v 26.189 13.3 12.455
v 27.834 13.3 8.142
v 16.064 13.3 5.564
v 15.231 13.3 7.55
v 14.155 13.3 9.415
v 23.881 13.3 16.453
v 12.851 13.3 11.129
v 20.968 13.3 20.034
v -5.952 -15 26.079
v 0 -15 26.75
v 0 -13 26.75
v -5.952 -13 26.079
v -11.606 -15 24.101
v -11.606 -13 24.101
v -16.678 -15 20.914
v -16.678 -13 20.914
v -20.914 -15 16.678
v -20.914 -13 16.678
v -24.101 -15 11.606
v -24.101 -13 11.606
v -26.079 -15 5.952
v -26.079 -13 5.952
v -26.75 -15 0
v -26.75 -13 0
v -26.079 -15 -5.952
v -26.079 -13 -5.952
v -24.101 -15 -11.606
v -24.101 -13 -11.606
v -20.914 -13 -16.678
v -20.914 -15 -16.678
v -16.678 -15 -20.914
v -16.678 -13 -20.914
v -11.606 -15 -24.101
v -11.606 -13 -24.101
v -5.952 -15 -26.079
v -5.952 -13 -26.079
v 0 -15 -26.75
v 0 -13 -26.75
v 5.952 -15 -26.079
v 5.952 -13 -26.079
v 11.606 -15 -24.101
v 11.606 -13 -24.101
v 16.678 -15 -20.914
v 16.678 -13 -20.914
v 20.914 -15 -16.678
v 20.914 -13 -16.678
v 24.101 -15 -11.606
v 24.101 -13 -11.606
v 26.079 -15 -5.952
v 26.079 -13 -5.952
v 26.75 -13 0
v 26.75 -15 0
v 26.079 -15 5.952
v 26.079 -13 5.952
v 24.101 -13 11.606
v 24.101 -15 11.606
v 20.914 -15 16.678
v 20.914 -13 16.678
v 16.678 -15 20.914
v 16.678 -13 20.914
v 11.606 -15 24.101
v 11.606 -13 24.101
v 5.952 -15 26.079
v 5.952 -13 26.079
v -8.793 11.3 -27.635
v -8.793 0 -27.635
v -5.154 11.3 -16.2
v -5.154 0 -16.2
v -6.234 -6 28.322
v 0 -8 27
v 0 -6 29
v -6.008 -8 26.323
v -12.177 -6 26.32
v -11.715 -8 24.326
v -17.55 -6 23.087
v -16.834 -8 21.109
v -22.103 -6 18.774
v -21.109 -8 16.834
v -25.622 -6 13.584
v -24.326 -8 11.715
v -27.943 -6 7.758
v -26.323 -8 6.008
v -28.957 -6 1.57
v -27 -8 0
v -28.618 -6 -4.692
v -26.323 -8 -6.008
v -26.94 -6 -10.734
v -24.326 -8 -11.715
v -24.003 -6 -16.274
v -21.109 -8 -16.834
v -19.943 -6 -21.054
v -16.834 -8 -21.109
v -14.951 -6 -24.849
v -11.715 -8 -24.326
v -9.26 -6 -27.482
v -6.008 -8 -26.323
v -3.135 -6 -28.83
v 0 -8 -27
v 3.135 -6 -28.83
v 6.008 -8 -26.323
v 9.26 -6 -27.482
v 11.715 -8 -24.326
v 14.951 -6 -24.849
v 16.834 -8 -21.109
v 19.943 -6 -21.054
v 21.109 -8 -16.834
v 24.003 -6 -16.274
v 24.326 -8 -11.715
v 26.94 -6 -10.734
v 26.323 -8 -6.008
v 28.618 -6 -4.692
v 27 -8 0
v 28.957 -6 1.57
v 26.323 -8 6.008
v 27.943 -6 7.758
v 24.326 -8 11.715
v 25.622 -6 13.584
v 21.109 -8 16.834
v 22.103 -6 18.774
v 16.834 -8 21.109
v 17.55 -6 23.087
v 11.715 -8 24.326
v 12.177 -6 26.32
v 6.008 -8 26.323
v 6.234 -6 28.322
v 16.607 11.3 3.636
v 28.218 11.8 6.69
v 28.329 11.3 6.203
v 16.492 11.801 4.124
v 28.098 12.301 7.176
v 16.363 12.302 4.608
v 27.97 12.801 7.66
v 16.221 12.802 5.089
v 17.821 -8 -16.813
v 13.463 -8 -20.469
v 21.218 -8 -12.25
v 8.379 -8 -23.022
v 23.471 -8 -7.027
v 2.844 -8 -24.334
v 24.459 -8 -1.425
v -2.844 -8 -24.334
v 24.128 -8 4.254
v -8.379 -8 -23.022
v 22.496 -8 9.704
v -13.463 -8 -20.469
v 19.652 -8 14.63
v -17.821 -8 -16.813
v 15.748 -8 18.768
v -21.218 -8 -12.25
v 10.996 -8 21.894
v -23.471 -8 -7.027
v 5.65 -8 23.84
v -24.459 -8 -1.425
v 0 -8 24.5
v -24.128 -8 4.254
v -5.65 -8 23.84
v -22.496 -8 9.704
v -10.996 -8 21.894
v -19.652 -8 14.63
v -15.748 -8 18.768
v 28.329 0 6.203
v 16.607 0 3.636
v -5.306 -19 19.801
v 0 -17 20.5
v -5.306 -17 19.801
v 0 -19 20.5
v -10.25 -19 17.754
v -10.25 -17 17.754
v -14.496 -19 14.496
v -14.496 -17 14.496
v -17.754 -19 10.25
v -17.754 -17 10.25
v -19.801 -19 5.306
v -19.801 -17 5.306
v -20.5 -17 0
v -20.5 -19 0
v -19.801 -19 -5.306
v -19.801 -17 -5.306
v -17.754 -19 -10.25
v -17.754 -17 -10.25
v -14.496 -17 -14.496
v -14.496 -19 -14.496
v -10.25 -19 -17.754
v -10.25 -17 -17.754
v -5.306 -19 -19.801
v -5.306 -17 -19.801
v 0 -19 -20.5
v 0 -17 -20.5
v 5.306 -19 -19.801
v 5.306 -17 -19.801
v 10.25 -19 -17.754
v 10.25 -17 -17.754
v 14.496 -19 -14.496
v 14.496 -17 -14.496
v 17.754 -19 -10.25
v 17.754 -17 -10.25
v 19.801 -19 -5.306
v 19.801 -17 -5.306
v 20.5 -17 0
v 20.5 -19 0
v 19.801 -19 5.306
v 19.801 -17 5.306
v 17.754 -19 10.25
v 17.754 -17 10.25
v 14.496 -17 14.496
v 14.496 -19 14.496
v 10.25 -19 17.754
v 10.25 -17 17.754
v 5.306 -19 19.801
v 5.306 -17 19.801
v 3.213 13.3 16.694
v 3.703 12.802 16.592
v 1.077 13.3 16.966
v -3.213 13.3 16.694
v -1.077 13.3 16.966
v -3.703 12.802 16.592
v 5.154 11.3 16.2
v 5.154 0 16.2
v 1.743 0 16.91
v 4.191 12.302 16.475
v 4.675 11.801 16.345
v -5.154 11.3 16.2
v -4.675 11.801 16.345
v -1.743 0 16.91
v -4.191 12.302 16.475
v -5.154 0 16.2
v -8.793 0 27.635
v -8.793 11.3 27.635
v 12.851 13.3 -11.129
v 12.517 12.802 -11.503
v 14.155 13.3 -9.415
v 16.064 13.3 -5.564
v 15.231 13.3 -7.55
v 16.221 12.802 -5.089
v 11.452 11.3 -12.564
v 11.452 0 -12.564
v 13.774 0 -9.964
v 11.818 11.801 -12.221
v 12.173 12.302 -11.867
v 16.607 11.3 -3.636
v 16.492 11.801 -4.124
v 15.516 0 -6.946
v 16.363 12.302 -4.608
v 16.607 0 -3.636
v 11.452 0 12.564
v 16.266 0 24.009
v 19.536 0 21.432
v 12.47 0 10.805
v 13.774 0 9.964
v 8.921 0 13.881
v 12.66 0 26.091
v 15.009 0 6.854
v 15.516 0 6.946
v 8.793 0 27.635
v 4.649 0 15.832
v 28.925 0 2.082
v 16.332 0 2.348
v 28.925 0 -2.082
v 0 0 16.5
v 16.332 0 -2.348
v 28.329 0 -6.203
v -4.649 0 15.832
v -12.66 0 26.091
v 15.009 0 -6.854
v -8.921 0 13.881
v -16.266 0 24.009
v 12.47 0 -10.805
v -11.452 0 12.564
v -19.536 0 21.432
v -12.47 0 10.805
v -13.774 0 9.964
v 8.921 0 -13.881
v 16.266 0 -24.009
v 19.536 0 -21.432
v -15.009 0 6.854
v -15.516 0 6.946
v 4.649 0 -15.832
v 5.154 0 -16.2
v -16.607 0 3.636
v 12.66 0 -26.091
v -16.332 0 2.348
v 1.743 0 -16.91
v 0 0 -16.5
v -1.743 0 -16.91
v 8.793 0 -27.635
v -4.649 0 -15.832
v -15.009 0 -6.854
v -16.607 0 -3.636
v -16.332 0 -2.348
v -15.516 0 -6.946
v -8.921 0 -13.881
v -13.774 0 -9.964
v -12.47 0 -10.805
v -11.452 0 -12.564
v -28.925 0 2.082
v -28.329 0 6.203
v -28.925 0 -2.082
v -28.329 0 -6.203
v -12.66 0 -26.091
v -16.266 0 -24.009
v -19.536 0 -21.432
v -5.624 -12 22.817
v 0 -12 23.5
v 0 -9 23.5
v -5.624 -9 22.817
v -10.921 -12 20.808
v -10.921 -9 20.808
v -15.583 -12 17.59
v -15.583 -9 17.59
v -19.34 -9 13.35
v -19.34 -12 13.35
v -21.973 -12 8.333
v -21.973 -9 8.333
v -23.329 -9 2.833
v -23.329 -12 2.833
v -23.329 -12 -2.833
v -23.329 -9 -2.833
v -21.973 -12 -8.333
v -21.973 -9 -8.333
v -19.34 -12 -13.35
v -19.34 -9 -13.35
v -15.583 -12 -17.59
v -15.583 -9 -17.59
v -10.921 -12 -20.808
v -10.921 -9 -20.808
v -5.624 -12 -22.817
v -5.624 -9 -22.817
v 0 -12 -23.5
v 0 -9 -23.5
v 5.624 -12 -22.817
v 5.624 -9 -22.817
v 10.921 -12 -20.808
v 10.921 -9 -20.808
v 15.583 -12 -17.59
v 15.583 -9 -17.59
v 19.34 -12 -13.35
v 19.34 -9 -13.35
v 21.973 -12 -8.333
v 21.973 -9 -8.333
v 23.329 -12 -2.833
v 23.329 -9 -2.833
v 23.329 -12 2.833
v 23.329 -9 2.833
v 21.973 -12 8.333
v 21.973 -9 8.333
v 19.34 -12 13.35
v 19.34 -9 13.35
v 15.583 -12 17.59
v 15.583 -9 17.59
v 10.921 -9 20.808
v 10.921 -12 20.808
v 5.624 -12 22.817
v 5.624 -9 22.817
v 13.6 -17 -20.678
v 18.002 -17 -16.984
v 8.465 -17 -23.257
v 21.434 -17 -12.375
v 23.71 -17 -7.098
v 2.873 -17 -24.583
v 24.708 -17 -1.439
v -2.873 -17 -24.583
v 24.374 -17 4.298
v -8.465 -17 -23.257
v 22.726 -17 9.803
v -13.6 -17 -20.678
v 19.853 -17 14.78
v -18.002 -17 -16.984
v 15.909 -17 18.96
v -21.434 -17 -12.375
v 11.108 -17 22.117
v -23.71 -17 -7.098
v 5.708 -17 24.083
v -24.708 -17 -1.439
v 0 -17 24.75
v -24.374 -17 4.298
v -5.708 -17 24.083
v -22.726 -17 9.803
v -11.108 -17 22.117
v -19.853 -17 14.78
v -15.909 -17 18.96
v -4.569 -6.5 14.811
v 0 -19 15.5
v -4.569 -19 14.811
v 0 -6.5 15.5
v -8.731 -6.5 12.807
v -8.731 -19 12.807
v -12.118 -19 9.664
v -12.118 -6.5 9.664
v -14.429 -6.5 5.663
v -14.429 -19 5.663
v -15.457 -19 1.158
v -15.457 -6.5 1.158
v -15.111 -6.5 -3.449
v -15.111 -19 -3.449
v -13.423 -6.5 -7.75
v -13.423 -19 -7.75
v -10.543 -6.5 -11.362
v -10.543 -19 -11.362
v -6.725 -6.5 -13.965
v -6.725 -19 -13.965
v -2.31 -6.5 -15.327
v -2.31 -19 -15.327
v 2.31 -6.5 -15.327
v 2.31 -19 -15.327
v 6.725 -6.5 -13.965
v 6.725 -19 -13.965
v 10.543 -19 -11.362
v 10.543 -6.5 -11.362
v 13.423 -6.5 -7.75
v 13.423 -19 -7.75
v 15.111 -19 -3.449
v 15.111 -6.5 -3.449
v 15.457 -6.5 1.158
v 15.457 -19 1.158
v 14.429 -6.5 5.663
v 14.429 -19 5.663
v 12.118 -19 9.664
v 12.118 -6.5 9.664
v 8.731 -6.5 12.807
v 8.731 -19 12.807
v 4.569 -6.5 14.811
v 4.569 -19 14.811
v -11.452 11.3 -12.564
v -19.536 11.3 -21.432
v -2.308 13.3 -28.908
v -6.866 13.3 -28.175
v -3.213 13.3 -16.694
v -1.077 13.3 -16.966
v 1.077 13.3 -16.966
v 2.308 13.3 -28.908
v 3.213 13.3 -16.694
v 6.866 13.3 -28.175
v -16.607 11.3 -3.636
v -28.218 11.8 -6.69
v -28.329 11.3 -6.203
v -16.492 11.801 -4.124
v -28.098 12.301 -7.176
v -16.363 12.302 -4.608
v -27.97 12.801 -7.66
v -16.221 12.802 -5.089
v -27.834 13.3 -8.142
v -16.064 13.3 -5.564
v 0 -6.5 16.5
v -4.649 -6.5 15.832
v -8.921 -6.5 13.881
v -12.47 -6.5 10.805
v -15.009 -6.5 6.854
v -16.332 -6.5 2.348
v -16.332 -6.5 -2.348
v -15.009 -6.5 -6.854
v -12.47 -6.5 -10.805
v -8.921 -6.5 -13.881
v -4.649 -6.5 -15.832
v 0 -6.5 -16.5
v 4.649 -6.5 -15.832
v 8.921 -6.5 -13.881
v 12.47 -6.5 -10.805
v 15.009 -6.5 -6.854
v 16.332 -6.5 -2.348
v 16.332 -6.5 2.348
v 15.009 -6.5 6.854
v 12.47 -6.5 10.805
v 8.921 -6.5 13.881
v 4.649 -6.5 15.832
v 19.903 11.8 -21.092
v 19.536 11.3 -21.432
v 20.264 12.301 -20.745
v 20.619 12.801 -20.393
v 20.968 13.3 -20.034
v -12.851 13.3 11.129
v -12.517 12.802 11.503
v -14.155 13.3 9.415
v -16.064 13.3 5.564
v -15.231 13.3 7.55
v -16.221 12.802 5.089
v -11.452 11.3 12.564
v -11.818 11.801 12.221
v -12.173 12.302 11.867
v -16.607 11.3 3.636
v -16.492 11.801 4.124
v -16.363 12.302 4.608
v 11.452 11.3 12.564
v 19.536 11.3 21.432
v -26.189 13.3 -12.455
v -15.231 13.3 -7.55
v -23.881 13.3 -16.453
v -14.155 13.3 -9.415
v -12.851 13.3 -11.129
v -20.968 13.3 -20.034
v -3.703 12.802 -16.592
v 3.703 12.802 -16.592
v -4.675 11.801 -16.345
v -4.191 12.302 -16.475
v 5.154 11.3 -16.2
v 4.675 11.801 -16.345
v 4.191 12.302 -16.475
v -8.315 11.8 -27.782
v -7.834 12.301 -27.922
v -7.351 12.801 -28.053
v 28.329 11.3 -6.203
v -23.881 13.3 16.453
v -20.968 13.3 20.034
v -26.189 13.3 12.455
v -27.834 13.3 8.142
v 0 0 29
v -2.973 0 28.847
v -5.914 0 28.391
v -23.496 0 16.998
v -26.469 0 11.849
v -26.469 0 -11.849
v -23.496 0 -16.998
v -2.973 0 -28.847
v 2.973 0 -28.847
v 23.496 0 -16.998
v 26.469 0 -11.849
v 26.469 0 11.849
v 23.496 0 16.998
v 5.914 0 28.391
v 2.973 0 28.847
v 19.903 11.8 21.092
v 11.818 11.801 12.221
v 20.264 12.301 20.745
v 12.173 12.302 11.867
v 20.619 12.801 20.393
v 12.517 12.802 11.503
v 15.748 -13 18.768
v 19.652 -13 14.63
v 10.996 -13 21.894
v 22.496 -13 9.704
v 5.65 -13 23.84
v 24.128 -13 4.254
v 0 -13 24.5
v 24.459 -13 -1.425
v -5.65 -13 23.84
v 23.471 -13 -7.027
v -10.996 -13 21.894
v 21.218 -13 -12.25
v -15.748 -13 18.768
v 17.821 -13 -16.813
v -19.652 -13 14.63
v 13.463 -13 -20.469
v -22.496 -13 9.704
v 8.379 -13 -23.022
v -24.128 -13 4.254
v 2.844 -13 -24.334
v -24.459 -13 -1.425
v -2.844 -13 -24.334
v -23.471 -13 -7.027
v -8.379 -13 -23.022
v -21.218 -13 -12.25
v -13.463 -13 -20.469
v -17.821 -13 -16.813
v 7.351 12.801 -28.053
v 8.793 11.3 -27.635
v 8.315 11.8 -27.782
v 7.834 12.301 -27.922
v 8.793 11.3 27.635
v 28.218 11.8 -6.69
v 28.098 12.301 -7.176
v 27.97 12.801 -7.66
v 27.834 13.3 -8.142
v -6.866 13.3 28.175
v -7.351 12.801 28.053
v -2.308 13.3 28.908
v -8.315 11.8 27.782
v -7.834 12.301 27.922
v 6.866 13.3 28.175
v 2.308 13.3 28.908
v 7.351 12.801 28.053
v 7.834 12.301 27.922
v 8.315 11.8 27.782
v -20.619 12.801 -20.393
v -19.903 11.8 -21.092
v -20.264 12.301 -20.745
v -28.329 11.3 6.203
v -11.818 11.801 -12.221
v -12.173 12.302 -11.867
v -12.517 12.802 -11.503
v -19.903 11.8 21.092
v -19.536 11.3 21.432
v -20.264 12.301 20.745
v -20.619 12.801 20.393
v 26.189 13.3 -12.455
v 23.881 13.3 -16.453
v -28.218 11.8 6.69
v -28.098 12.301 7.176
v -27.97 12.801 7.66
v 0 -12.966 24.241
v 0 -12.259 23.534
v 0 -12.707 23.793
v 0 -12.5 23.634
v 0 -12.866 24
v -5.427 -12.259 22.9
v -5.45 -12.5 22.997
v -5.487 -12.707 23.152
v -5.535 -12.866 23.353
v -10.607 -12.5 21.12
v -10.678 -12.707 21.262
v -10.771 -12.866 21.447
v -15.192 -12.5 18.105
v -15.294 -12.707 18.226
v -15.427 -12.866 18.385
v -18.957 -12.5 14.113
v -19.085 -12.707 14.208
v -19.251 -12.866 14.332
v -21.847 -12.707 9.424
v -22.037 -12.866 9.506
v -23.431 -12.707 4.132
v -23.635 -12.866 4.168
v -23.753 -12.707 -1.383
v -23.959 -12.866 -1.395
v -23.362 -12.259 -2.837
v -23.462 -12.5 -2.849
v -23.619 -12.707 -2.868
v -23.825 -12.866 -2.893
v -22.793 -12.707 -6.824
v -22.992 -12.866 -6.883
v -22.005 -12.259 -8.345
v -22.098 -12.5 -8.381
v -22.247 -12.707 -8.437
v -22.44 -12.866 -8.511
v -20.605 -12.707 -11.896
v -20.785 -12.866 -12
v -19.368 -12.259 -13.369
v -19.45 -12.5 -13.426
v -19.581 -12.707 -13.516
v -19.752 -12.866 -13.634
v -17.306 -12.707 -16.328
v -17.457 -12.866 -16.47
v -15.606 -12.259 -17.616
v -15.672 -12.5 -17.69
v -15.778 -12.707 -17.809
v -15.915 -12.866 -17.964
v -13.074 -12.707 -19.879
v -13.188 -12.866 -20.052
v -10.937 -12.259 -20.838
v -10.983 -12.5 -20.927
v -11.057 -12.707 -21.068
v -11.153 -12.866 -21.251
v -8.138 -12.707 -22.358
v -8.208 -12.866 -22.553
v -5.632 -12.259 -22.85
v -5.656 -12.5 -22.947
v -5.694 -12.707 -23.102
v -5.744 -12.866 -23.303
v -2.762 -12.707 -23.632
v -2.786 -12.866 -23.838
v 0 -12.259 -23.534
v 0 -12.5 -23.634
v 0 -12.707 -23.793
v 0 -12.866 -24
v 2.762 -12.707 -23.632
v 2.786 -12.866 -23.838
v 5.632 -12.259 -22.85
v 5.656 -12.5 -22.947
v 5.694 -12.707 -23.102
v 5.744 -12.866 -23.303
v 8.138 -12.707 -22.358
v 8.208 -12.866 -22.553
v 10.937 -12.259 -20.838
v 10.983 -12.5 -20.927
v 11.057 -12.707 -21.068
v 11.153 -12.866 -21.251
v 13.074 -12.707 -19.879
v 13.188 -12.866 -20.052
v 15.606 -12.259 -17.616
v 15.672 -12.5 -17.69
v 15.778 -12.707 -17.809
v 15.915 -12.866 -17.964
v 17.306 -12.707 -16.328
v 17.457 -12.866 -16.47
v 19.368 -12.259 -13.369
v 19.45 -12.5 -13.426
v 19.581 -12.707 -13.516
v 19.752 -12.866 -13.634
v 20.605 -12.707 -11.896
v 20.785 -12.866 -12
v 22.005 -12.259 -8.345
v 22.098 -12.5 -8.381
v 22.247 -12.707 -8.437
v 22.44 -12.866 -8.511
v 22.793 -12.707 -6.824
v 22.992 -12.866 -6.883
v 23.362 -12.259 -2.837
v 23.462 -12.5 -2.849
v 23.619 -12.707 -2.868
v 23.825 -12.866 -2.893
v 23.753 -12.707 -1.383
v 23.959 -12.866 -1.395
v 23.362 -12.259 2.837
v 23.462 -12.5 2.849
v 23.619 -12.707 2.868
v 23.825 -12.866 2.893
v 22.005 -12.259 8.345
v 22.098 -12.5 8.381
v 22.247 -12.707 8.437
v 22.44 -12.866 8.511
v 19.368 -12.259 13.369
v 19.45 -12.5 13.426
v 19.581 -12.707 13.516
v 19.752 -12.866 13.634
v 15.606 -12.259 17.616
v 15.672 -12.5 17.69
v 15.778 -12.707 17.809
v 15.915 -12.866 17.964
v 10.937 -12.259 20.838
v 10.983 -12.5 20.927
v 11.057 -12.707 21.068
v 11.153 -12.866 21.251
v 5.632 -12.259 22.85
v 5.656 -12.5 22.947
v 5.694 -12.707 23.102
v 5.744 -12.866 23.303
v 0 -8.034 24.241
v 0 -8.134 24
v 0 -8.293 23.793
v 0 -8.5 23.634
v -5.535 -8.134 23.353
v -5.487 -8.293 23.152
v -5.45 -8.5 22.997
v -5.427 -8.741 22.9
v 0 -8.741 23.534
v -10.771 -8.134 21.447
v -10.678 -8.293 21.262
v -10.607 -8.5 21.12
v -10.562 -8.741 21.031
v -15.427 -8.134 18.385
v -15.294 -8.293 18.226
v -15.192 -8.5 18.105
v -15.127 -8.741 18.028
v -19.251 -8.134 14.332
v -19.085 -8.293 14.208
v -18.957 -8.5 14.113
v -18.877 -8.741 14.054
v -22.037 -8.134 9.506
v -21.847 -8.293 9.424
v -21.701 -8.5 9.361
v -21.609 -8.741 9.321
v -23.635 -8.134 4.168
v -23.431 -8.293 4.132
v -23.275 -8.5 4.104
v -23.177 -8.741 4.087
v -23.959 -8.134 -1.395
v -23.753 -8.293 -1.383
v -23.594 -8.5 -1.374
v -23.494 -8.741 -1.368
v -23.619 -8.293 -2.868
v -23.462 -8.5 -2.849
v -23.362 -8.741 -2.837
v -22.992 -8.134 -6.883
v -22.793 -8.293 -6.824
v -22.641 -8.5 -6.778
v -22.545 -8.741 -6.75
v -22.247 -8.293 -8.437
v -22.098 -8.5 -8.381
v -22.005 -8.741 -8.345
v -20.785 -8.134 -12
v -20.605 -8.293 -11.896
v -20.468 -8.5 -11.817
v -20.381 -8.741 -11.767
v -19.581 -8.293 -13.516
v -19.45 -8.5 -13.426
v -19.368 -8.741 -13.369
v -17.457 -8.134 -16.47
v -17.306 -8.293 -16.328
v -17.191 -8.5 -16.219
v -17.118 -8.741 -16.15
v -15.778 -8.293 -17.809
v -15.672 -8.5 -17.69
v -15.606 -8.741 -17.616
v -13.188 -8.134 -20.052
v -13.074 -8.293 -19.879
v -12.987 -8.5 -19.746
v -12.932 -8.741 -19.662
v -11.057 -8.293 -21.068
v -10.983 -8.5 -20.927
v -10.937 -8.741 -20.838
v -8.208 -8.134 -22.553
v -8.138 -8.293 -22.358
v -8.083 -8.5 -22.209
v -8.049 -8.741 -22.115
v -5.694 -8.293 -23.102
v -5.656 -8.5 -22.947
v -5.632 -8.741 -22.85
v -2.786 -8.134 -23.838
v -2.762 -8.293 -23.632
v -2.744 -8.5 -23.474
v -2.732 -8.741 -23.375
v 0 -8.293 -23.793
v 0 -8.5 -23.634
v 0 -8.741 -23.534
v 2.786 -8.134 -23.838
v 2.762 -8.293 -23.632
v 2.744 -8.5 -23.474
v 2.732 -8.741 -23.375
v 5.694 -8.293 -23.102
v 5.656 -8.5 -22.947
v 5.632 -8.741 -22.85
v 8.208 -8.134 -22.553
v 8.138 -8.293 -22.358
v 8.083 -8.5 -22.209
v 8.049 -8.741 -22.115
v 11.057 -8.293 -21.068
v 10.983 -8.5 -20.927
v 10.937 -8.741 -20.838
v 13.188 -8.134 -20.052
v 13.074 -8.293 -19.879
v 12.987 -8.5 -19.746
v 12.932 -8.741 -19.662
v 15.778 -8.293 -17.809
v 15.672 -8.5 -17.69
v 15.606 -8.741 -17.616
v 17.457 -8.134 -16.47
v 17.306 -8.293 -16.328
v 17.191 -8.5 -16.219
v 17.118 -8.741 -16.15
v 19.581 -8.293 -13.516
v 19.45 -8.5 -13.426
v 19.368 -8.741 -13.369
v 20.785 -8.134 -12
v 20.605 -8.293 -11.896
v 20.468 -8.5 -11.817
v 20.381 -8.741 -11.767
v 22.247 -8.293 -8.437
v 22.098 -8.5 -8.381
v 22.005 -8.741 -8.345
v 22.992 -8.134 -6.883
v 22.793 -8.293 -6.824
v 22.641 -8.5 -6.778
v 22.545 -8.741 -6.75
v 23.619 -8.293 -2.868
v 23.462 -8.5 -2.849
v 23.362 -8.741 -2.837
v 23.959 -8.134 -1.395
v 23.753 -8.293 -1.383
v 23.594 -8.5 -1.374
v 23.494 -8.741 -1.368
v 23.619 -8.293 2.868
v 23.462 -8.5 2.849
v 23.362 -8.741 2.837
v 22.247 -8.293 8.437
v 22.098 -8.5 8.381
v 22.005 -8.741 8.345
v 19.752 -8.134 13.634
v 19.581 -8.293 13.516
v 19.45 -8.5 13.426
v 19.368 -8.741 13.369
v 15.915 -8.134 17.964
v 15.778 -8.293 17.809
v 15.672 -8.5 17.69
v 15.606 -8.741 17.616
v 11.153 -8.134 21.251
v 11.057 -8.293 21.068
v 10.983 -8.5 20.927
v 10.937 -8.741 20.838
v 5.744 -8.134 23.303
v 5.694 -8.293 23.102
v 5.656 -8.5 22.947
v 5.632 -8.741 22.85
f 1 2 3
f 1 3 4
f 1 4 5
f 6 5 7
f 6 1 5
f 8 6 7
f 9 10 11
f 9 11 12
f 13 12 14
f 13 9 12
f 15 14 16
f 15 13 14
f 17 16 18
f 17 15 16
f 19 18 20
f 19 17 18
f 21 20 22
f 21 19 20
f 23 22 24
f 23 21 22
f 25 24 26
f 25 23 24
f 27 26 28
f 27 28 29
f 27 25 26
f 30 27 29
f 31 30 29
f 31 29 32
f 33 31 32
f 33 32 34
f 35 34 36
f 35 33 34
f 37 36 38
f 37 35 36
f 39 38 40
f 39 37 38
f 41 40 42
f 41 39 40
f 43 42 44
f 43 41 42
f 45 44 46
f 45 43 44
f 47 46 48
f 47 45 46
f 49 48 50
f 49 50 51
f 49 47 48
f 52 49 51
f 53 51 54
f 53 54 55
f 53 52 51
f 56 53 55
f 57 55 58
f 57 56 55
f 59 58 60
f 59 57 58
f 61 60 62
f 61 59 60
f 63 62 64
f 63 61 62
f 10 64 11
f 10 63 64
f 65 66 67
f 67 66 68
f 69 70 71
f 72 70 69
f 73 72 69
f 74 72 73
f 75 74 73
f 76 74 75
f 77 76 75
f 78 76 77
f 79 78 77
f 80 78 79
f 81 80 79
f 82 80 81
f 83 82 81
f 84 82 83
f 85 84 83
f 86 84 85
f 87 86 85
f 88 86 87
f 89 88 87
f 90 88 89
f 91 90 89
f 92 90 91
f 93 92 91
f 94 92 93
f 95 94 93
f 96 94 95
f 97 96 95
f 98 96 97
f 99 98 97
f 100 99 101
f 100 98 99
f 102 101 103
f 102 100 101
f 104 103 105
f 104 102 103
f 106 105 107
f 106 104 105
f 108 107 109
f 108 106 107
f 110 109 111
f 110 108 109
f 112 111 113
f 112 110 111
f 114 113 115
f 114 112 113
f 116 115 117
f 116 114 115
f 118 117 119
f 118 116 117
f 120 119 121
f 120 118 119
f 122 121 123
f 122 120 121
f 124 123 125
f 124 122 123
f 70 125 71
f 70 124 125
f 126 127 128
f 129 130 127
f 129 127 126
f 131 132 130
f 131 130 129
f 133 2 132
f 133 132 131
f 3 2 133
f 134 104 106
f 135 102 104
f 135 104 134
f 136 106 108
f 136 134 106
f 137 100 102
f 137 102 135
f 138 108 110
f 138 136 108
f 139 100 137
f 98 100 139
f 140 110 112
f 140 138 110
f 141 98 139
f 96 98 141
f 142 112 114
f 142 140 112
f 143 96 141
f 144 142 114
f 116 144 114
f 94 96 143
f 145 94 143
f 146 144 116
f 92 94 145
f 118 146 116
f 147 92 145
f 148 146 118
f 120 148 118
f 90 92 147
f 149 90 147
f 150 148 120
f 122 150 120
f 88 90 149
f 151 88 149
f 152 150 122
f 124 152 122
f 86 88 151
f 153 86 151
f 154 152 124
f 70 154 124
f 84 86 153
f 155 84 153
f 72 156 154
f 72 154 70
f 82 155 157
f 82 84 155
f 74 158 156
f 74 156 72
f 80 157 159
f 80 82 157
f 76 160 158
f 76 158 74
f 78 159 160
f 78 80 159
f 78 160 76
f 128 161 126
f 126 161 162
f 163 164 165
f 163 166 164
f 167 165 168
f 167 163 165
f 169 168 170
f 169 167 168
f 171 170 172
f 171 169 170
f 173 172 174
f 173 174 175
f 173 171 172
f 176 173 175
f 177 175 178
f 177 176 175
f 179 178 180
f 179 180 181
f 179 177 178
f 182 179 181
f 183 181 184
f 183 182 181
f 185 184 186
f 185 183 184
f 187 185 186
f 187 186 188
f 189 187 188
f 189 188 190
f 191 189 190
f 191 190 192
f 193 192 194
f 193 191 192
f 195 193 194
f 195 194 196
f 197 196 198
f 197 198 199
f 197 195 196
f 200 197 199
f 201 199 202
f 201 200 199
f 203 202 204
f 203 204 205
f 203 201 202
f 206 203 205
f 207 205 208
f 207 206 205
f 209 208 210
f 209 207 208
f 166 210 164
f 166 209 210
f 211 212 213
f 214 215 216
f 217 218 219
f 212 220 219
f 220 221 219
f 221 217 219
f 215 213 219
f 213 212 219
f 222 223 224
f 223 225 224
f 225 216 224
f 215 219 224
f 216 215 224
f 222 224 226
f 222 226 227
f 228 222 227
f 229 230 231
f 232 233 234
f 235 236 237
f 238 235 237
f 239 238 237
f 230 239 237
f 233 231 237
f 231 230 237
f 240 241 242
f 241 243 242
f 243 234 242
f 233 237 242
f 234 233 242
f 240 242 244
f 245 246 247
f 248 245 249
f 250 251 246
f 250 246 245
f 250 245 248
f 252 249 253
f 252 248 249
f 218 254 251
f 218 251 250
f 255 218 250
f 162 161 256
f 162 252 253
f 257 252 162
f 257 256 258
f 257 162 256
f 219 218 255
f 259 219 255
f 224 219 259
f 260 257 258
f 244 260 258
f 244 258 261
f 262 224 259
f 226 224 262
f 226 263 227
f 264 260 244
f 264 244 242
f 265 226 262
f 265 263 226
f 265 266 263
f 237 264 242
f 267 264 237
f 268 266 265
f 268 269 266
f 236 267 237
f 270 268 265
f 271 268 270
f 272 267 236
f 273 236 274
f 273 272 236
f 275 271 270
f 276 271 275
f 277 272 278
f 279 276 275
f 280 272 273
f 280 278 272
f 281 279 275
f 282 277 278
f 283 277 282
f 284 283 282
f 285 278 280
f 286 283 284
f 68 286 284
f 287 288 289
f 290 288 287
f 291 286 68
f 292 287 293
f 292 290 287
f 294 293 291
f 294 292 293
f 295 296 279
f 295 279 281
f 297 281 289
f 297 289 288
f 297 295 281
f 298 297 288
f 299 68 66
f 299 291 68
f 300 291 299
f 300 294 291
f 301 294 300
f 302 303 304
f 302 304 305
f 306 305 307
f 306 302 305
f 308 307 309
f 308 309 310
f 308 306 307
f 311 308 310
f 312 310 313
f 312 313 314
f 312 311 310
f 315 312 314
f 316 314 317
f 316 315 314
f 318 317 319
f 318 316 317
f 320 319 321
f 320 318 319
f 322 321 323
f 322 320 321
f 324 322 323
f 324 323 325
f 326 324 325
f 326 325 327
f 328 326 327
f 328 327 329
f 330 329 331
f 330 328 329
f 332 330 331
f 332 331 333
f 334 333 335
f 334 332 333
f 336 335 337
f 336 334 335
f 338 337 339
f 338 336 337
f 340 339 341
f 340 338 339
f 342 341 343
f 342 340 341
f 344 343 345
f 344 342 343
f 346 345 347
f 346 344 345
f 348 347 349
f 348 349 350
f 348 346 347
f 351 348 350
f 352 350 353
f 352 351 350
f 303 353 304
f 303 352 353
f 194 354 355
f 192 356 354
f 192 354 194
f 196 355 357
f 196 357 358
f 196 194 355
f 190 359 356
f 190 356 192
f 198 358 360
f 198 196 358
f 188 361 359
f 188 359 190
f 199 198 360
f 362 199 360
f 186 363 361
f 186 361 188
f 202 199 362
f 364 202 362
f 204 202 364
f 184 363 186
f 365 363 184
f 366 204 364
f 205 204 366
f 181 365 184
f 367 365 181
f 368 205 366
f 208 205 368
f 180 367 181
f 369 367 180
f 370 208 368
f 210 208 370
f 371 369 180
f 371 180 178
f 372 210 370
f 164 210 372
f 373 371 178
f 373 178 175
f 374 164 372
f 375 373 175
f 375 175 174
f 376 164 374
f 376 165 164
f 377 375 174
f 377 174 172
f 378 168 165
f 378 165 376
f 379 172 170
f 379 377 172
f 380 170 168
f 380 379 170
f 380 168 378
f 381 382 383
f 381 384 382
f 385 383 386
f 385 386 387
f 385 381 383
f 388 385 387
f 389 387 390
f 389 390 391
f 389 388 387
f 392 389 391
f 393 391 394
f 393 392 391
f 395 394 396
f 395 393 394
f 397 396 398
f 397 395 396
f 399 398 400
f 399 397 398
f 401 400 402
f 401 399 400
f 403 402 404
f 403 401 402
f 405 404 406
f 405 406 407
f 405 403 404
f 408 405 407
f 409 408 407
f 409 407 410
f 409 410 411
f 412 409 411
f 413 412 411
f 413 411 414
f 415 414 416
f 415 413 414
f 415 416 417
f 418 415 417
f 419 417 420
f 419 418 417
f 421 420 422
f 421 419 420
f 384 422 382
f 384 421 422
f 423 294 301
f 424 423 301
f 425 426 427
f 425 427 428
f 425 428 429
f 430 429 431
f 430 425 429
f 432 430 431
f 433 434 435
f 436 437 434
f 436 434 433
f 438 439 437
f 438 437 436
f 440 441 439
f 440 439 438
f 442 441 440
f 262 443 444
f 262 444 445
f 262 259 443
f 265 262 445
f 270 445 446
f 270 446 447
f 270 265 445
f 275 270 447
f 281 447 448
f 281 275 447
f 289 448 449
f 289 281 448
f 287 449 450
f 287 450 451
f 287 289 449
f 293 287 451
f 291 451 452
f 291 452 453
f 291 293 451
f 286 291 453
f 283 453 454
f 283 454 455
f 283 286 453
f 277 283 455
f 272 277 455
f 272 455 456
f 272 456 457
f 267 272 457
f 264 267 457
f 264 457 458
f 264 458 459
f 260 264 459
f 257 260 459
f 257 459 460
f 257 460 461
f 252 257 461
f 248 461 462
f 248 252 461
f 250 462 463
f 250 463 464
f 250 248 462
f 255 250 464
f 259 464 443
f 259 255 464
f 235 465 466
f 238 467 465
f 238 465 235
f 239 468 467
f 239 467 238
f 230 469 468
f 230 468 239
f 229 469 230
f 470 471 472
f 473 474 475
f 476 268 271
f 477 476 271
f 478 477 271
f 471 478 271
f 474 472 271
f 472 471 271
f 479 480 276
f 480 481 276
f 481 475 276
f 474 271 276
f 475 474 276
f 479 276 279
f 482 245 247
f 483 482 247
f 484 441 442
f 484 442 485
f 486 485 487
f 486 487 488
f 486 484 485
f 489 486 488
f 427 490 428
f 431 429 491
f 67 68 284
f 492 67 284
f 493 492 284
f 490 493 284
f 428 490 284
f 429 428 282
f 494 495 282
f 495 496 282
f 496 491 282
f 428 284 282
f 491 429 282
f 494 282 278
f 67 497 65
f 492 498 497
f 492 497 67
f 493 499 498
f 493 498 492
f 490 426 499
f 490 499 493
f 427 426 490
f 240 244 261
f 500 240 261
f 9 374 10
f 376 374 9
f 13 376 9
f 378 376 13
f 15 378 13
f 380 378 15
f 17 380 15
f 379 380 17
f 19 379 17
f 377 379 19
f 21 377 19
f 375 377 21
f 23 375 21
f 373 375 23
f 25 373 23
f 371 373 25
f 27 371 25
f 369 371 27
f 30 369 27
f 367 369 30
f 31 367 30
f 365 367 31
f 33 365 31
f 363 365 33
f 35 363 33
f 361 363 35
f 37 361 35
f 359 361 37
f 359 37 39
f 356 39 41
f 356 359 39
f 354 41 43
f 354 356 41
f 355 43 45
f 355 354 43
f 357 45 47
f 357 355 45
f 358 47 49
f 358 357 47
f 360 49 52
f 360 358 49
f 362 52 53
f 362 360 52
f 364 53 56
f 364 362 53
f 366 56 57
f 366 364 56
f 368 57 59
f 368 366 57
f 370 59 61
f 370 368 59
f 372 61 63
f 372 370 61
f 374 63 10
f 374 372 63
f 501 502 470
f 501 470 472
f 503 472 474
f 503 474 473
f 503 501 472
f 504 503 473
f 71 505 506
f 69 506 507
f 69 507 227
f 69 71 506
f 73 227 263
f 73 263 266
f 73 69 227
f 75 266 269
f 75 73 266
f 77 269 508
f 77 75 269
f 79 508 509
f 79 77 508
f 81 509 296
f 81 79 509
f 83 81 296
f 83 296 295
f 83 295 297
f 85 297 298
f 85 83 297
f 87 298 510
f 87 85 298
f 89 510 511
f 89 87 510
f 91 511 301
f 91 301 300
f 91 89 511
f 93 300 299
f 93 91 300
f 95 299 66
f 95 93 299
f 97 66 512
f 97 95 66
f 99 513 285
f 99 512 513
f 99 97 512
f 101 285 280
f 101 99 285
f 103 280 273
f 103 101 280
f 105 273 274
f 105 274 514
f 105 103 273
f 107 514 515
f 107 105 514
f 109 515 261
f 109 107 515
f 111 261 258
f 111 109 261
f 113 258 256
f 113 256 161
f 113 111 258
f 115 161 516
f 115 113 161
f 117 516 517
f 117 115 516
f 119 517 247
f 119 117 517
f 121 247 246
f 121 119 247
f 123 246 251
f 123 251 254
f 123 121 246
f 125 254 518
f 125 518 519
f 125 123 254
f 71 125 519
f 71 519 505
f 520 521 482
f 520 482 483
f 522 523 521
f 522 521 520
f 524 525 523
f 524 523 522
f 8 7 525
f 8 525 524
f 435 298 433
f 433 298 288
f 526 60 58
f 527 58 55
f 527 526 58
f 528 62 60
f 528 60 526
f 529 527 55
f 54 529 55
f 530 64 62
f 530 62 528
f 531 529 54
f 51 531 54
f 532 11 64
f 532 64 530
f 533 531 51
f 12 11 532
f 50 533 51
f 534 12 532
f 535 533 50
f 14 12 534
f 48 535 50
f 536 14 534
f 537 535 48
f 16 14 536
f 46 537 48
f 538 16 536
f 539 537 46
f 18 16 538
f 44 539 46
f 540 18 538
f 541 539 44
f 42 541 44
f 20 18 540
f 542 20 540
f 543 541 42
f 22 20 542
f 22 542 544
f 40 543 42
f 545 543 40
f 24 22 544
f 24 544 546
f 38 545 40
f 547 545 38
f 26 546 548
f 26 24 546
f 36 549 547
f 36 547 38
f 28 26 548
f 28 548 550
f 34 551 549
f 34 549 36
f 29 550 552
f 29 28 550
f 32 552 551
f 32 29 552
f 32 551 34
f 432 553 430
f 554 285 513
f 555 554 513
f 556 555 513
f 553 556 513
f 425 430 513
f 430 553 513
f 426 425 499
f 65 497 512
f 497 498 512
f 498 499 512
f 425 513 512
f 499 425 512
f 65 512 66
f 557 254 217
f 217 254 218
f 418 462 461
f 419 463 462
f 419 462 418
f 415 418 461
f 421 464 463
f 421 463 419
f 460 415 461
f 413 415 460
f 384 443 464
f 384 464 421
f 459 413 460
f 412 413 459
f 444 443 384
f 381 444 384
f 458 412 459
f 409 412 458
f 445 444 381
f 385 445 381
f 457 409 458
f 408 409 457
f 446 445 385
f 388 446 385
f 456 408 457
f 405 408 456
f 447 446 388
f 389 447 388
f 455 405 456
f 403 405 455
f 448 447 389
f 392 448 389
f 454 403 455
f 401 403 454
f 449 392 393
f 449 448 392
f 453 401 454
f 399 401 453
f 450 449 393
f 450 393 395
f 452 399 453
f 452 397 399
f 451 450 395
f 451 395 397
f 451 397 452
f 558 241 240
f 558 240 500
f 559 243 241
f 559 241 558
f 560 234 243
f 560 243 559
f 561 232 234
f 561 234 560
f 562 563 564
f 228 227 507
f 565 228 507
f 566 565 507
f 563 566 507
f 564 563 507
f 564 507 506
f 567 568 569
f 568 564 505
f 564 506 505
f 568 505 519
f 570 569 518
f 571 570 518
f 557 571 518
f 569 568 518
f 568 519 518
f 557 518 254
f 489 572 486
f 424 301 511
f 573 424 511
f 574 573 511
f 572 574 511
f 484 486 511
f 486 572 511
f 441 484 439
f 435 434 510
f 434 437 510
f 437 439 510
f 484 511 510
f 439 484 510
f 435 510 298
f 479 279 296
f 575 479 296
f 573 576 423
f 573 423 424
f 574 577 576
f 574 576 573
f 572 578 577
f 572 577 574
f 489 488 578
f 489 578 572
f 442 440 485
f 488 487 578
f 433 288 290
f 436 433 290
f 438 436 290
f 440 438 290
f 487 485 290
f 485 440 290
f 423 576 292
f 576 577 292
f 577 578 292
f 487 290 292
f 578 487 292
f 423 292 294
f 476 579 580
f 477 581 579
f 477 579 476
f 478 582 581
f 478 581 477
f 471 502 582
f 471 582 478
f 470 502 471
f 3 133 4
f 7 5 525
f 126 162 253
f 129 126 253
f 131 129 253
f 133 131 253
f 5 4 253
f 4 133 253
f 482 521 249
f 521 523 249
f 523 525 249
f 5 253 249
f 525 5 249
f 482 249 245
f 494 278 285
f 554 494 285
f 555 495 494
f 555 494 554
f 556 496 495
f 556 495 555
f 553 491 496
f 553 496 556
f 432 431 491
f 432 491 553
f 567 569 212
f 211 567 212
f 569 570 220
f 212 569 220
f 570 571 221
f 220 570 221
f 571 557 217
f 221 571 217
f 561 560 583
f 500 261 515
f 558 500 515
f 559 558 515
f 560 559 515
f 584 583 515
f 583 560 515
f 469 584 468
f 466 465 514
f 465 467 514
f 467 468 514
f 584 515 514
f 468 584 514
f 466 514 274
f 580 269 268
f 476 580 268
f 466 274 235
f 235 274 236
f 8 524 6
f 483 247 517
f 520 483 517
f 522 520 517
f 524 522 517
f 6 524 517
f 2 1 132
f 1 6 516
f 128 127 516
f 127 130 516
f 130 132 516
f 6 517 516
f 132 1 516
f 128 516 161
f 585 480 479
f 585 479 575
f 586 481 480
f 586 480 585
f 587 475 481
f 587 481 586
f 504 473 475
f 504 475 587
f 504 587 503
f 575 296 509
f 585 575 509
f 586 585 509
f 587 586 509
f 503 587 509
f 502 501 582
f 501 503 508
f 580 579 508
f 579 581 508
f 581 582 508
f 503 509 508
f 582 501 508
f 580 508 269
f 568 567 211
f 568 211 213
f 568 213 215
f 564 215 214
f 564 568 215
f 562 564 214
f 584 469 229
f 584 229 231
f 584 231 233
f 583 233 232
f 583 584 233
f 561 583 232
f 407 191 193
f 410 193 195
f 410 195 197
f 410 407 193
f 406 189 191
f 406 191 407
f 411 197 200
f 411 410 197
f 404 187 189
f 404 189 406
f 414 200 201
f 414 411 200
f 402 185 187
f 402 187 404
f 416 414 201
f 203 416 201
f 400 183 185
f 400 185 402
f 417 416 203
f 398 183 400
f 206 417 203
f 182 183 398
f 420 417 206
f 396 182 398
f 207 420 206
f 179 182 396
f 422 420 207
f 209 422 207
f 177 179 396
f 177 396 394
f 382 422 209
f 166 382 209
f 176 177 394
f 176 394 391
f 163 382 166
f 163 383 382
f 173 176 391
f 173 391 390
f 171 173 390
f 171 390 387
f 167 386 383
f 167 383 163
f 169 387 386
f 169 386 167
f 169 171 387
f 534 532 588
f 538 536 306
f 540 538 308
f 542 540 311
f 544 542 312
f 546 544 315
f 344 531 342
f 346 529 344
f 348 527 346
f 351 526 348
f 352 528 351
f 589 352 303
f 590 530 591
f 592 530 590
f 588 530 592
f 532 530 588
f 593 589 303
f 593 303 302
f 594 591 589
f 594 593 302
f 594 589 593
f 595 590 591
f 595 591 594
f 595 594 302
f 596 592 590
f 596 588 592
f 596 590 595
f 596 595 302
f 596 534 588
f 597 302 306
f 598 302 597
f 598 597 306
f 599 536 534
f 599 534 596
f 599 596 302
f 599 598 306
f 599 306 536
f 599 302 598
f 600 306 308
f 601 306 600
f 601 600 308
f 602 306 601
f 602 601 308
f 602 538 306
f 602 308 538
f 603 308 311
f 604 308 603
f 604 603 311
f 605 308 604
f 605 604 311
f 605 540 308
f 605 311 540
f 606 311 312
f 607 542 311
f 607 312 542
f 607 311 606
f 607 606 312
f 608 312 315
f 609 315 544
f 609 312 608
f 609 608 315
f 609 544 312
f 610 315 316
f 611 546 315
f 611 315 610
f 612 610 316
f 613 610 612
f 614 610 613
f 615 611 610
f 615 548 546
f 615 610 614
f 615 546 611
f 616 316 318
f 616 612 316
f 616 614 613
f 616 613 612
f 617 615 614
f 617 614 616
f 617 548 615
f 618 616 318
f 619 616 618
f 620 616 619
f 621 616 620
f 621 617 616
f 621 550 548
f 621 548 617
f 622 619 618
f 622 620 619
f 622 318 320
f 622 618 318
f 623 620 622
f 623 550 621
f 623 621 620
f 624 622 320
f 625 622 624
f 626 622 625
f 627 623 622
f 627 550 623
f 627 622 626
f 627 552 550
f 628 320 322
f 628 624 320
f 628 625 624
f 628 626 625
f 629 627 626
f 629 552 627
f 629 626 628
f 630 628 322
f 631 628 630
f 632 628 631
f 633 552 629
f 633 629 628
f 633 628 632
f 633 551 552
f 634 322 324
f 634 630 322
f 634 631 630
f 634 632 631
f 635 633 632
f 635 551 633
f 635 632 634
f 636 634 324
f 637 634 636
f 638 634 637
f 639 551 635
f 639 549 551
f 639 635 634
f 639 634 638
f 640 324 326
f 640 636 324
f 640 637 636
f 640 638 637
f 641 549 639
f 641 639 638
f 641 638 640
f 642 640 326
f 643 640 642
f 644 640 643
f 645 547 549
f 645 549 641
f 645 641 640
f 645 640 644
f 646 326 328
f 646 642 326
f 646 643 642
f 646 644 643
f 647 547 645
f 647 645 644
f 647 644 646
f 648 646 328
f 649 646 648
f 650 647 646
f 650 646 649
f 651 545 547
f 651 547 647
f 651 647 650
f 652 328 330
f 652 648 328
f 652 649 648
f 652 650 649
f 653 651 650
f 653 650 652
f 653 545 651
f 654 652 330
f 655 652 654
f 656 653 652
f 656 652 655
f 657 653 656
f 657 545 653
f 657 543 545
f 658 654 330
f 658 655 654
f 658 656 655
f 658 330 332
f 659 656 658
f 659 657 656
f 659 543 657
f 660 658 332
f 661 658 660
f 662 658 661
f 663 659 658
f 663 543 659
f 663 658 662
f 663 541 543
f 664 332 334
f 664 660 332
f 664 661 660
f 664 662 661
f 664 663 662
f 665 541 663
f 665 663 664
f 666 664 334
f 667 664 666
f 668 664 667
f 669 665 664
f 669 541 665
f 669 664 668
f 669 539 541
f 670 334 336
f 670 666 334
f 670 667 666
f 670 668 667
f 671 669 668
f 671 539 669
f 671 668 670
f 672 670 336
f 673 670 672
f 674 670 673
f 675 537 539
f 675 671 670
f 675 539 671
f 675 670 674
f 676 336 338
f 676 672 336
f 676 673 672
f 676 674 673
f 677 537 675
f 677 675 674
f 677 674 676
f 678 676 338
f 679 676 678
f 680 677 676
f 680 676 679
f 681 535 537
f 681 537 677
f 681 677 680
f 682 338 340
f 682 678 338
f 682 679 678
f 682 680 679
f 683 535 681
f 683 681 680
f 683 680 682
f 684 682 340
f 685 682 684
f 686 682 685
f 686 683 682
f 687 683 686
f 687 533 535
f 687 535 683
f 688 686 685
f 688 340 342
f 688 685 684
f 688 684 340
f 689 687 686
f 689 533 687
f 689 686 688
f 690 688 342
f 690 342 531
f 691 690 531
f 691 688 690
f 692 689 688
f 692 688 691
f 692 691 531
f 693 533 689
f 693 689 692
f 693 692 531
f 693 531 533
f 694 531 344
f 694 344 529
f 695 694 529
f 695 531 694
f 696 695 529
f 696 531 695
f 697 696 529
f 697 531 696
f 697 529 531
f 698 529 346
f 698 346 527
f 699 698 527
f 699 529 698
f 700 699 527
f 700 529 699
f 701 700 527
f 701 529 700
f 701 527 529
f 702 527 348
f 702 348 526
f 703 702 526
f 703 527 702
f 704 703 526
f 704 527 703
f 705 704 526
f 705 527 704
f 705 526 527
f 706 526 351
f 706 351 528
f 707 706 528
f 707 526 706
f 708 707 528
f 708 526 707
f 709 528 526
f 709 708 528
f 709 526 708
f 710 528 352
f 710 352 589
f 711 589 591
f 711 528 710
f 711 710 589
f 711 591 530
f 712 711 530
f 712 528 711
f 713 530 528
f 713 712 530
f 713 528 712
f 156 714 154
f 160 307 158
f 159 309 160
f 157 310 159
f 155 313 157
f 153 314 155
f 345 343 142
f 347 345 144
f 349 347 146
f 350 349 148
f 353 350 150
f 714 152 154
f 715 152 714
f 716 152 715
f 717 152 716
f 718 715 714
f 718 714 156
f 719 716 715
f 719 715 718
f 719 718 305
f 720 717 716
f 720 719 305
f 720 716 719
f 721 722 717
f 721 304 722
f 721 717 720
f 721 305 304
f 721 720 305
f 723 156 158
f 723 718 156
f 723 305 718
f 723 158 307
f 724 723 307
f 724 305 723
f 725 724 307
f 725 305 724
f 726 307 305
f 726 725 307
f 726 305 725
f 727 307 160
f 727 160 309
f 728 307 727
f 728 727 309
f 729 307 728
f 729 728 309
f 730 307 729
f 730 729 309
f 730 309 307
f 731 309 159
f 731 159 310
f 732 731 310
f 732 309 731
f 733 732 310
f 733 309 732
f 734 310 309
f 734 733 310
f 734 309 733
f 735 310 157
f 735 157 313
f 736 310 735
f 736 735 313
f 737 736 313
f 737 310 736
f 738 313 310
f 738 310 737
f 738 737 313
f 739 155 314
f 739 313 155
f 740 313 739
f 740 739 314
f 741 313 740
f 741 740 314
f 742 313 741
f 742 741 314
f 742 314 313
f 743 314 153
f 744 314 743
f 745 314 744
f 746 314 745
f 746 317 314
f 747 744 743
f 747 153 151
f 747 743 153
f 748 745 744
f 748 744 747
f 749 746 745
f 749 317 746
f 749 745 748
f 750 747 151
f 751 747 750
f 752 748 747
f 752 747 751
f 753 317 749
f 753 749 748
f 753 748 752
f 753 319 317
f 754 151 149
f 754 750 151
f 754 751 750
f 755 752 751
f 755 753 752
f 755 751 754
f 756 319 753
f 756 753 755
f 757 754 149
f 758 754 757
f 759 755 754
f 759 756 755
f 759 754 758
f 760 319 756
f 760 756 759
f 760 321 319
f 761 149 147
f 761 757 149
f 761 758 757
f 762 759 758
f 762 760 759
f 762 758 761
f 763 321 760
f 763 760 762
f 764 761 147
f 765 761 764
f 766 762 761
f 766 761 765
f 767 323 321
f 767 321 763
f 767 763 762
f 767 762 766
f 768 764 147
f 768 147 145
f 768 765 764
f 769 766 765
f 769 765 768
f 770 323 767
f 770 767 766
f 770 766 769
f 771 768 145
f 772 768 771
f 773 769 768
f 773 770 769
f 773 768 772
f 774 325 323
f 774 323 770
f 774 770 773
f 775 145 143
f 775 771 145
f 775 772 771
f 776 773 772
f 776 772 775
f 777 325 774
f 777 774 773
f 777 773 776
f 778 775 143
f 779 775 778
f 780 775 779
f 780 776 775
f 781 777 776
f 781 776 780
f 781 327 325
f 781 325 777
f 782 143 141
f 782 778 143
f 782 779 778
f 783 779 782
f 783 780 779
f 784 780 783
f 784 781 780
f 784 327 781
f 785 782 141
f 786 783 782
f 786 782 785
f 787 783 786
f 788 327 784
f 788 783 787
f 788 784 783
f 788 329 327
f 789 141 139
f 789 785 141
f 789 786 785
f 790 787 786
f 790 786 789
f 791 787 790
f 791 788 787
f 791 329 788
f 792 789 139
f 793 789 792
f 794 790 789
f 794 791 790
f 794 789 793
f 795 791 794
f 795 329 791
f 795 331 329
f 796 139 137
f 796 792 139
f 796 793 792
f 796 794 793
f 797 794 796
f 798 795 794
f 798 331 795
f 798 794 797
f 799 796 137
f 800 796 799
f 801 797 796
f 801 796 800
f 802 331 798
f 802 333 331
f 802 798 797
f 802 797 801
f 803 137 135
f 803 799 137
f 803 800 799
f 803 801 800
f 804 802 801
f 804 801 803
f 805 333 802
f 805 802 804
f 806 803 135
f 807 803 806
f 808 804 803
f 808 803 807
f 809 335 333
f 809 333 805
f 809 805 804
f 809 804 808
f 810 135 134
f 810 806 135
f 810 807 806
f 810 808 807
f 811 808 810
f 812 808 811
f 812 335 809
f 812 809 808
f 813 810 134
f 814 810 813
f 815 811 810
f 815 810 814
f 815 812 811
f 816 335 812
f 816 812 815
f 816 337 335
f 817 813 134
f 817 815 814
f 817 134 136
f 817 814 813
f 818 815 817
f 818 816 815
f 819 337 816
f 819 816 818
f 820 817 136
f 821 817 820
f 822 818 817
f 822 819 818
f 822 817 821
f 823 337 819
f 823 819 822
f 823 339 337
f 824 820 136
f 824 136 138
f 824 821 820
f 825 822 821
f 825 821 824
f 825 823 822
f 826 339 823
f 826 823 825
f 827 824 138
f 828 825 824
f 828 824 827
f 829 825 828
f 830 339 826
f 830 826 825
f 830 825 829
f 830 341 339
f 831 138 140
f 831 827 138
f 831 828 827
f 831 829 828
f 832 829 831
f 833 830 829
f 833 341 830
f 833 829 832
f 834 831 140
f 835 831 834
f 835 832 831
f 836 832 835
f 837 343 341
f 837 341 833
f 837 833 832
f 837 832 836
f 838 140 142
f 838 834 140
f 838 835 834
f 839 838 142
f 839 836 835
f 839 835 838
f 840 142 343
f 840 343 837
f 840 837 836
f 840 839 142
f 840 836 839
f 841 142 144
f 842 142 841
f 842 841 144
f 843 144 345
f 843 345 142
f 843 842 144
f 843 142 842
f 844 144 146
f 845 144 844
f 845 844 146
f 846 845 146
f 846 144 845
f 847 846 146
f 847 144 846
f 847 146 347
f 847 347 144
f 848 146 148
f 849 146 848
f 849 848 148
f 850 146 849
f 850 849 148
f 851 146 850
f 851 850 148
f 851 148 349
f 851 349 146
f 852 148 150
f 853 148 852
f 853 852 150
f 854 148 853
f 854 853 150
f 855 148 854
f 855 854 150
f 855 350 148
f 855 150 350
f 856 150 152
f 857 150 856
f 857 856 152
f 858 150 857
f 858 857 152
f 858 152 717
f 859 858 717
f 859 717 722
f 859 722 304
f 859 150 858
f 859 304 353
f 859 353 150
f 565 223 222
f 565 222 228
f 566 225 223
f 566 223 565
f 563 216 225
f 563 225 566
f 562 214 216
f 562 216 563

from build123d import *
from build123d.topology import SkipClean

# Parameters (mm, degrees)
BOSS_EXTRUDE1_DEPTH          = 13.3
CHAMFER1_SIZE                = 2
CIRPATTERN1_COUNT            = 6
CHAMFER1_OF_CIRPATTERN1_SIZE = 2
CHAMFER2_SIZE                = 2
FILLET1_R                    = 1


with BuildPart() as part:
    # Sketch1 → Revolve1 (revolve)
    with BuildSketch(Plane.XY, mode=Mode.PRIVATE) as revolve1_sk:
        Polygon((-16.5, 0), (-29, 0), (-29, -8), (-23.5, -8), (-23.5, -13), (-26.75, -13), (-26.75, -17), (-20.5, -17), (-20.5, -19), (-15.5, -19), (-15.5, -6.5), (-16.5, -6.5), align=None)
    revolve(revolve1_sk.sketch.rotate(Axis((0, 0, 0), (0, -1, 0)), 270), axis=Axis((0, 0, 0), (0, -1, 0)))

    # Sketch2 → Boss-Extrude1 (add)
    with SkipClean():  # the faces are left unmerged after this step: merging them gives an invalid solid
        with BuildSketch(Plane(origin=(0, 0, 0), x_dir=(1, 0, 0), z_dir=(0, 1, 0))):
            with BuildLine():
                Line((5.154427, 16.199749), (8.792846, 27.634867))
                ThreePointArc((8.792846, 27.634867), (0, 29), (-8.792846, 27.634867))
                Line((-8.792846, 27.634867), (-5.154427, 16.199749))
                ThreePointArc((-5.154427, 16.199749), (0, 17), (5.154427, 16.199749))
            make_face()
        boss_extrude1 = extrude(amount=BOSS_EXTRUDE1_DEPTH)

    # Chamfer1
    chamfer1_edges = [part.edges().sort_by_distance(p)[0] for p in [
        (6.973637, 13.3, -21.917308),
        (-6.973637, 13.3, -21.917308),
    ]]
    chamfer(chamfer1_edges, length=CHAMFER1_SIZE)

    # CirPattern1: Boss-Extrude1 ×6 about axis
    with SkipClean():  # the faces are left unmerged after this step: merging them gives an invalid solid
        cirpattern1_axis = Axis((0, 0, 0), (0, 1, 0))
        for i in range(1, CIRPATTERN1_COUNT):
            add(boss_extrude1.rotate(cirpattern1_axis, i * 360 / CIRPATTERN1_COUNT))

    # Chamfer1 of CirPattern1
    chamfer1_of_cirpattern1_edges = [part.edges().sort_by_distance(p)[0] for p in [
        (-15.494127, 13.3, -16.998),
        (-22.467764, 13.3, -4.919308),
        (-22.467764, 13.3, 4.919308),
        (-15.494127, 13.3, 16.998),
        (-6.973637, 13.3, 21.917308),
        (6.973637, 13.3, 21.917308),
        (15.494127, 13.3, 16.998),
        (22.467764, 13.3, 4.919308),
        (22.467764, 13.3, -4.919308),
        (15.494127, 13.3, -16.998),
    ]]
    chamfer(chamfer1_of_cirpattern1_edges, length=CHAMFER1_OF_CIRPATTERN1_SIZE)

    # Chamfer2
    chamfer2_edges = [part.edges().sort_by_distance(p)[0] for p in [
        (0, -17, -26.75),
        (0, -8, -29),
    ]]
    chamfer(chamfer2_edges, length=CHAMFER2_SIZE)

    # Fillet1
    fillet1_edges = [part.edges().sort_by_distance(p)[0] for p in [
        (0, -13, -23.5),
        (0, -8, -23.5),
    ]]
    fillet(fillet1_edges, radius=FILLET1_R)


solid = part.part
